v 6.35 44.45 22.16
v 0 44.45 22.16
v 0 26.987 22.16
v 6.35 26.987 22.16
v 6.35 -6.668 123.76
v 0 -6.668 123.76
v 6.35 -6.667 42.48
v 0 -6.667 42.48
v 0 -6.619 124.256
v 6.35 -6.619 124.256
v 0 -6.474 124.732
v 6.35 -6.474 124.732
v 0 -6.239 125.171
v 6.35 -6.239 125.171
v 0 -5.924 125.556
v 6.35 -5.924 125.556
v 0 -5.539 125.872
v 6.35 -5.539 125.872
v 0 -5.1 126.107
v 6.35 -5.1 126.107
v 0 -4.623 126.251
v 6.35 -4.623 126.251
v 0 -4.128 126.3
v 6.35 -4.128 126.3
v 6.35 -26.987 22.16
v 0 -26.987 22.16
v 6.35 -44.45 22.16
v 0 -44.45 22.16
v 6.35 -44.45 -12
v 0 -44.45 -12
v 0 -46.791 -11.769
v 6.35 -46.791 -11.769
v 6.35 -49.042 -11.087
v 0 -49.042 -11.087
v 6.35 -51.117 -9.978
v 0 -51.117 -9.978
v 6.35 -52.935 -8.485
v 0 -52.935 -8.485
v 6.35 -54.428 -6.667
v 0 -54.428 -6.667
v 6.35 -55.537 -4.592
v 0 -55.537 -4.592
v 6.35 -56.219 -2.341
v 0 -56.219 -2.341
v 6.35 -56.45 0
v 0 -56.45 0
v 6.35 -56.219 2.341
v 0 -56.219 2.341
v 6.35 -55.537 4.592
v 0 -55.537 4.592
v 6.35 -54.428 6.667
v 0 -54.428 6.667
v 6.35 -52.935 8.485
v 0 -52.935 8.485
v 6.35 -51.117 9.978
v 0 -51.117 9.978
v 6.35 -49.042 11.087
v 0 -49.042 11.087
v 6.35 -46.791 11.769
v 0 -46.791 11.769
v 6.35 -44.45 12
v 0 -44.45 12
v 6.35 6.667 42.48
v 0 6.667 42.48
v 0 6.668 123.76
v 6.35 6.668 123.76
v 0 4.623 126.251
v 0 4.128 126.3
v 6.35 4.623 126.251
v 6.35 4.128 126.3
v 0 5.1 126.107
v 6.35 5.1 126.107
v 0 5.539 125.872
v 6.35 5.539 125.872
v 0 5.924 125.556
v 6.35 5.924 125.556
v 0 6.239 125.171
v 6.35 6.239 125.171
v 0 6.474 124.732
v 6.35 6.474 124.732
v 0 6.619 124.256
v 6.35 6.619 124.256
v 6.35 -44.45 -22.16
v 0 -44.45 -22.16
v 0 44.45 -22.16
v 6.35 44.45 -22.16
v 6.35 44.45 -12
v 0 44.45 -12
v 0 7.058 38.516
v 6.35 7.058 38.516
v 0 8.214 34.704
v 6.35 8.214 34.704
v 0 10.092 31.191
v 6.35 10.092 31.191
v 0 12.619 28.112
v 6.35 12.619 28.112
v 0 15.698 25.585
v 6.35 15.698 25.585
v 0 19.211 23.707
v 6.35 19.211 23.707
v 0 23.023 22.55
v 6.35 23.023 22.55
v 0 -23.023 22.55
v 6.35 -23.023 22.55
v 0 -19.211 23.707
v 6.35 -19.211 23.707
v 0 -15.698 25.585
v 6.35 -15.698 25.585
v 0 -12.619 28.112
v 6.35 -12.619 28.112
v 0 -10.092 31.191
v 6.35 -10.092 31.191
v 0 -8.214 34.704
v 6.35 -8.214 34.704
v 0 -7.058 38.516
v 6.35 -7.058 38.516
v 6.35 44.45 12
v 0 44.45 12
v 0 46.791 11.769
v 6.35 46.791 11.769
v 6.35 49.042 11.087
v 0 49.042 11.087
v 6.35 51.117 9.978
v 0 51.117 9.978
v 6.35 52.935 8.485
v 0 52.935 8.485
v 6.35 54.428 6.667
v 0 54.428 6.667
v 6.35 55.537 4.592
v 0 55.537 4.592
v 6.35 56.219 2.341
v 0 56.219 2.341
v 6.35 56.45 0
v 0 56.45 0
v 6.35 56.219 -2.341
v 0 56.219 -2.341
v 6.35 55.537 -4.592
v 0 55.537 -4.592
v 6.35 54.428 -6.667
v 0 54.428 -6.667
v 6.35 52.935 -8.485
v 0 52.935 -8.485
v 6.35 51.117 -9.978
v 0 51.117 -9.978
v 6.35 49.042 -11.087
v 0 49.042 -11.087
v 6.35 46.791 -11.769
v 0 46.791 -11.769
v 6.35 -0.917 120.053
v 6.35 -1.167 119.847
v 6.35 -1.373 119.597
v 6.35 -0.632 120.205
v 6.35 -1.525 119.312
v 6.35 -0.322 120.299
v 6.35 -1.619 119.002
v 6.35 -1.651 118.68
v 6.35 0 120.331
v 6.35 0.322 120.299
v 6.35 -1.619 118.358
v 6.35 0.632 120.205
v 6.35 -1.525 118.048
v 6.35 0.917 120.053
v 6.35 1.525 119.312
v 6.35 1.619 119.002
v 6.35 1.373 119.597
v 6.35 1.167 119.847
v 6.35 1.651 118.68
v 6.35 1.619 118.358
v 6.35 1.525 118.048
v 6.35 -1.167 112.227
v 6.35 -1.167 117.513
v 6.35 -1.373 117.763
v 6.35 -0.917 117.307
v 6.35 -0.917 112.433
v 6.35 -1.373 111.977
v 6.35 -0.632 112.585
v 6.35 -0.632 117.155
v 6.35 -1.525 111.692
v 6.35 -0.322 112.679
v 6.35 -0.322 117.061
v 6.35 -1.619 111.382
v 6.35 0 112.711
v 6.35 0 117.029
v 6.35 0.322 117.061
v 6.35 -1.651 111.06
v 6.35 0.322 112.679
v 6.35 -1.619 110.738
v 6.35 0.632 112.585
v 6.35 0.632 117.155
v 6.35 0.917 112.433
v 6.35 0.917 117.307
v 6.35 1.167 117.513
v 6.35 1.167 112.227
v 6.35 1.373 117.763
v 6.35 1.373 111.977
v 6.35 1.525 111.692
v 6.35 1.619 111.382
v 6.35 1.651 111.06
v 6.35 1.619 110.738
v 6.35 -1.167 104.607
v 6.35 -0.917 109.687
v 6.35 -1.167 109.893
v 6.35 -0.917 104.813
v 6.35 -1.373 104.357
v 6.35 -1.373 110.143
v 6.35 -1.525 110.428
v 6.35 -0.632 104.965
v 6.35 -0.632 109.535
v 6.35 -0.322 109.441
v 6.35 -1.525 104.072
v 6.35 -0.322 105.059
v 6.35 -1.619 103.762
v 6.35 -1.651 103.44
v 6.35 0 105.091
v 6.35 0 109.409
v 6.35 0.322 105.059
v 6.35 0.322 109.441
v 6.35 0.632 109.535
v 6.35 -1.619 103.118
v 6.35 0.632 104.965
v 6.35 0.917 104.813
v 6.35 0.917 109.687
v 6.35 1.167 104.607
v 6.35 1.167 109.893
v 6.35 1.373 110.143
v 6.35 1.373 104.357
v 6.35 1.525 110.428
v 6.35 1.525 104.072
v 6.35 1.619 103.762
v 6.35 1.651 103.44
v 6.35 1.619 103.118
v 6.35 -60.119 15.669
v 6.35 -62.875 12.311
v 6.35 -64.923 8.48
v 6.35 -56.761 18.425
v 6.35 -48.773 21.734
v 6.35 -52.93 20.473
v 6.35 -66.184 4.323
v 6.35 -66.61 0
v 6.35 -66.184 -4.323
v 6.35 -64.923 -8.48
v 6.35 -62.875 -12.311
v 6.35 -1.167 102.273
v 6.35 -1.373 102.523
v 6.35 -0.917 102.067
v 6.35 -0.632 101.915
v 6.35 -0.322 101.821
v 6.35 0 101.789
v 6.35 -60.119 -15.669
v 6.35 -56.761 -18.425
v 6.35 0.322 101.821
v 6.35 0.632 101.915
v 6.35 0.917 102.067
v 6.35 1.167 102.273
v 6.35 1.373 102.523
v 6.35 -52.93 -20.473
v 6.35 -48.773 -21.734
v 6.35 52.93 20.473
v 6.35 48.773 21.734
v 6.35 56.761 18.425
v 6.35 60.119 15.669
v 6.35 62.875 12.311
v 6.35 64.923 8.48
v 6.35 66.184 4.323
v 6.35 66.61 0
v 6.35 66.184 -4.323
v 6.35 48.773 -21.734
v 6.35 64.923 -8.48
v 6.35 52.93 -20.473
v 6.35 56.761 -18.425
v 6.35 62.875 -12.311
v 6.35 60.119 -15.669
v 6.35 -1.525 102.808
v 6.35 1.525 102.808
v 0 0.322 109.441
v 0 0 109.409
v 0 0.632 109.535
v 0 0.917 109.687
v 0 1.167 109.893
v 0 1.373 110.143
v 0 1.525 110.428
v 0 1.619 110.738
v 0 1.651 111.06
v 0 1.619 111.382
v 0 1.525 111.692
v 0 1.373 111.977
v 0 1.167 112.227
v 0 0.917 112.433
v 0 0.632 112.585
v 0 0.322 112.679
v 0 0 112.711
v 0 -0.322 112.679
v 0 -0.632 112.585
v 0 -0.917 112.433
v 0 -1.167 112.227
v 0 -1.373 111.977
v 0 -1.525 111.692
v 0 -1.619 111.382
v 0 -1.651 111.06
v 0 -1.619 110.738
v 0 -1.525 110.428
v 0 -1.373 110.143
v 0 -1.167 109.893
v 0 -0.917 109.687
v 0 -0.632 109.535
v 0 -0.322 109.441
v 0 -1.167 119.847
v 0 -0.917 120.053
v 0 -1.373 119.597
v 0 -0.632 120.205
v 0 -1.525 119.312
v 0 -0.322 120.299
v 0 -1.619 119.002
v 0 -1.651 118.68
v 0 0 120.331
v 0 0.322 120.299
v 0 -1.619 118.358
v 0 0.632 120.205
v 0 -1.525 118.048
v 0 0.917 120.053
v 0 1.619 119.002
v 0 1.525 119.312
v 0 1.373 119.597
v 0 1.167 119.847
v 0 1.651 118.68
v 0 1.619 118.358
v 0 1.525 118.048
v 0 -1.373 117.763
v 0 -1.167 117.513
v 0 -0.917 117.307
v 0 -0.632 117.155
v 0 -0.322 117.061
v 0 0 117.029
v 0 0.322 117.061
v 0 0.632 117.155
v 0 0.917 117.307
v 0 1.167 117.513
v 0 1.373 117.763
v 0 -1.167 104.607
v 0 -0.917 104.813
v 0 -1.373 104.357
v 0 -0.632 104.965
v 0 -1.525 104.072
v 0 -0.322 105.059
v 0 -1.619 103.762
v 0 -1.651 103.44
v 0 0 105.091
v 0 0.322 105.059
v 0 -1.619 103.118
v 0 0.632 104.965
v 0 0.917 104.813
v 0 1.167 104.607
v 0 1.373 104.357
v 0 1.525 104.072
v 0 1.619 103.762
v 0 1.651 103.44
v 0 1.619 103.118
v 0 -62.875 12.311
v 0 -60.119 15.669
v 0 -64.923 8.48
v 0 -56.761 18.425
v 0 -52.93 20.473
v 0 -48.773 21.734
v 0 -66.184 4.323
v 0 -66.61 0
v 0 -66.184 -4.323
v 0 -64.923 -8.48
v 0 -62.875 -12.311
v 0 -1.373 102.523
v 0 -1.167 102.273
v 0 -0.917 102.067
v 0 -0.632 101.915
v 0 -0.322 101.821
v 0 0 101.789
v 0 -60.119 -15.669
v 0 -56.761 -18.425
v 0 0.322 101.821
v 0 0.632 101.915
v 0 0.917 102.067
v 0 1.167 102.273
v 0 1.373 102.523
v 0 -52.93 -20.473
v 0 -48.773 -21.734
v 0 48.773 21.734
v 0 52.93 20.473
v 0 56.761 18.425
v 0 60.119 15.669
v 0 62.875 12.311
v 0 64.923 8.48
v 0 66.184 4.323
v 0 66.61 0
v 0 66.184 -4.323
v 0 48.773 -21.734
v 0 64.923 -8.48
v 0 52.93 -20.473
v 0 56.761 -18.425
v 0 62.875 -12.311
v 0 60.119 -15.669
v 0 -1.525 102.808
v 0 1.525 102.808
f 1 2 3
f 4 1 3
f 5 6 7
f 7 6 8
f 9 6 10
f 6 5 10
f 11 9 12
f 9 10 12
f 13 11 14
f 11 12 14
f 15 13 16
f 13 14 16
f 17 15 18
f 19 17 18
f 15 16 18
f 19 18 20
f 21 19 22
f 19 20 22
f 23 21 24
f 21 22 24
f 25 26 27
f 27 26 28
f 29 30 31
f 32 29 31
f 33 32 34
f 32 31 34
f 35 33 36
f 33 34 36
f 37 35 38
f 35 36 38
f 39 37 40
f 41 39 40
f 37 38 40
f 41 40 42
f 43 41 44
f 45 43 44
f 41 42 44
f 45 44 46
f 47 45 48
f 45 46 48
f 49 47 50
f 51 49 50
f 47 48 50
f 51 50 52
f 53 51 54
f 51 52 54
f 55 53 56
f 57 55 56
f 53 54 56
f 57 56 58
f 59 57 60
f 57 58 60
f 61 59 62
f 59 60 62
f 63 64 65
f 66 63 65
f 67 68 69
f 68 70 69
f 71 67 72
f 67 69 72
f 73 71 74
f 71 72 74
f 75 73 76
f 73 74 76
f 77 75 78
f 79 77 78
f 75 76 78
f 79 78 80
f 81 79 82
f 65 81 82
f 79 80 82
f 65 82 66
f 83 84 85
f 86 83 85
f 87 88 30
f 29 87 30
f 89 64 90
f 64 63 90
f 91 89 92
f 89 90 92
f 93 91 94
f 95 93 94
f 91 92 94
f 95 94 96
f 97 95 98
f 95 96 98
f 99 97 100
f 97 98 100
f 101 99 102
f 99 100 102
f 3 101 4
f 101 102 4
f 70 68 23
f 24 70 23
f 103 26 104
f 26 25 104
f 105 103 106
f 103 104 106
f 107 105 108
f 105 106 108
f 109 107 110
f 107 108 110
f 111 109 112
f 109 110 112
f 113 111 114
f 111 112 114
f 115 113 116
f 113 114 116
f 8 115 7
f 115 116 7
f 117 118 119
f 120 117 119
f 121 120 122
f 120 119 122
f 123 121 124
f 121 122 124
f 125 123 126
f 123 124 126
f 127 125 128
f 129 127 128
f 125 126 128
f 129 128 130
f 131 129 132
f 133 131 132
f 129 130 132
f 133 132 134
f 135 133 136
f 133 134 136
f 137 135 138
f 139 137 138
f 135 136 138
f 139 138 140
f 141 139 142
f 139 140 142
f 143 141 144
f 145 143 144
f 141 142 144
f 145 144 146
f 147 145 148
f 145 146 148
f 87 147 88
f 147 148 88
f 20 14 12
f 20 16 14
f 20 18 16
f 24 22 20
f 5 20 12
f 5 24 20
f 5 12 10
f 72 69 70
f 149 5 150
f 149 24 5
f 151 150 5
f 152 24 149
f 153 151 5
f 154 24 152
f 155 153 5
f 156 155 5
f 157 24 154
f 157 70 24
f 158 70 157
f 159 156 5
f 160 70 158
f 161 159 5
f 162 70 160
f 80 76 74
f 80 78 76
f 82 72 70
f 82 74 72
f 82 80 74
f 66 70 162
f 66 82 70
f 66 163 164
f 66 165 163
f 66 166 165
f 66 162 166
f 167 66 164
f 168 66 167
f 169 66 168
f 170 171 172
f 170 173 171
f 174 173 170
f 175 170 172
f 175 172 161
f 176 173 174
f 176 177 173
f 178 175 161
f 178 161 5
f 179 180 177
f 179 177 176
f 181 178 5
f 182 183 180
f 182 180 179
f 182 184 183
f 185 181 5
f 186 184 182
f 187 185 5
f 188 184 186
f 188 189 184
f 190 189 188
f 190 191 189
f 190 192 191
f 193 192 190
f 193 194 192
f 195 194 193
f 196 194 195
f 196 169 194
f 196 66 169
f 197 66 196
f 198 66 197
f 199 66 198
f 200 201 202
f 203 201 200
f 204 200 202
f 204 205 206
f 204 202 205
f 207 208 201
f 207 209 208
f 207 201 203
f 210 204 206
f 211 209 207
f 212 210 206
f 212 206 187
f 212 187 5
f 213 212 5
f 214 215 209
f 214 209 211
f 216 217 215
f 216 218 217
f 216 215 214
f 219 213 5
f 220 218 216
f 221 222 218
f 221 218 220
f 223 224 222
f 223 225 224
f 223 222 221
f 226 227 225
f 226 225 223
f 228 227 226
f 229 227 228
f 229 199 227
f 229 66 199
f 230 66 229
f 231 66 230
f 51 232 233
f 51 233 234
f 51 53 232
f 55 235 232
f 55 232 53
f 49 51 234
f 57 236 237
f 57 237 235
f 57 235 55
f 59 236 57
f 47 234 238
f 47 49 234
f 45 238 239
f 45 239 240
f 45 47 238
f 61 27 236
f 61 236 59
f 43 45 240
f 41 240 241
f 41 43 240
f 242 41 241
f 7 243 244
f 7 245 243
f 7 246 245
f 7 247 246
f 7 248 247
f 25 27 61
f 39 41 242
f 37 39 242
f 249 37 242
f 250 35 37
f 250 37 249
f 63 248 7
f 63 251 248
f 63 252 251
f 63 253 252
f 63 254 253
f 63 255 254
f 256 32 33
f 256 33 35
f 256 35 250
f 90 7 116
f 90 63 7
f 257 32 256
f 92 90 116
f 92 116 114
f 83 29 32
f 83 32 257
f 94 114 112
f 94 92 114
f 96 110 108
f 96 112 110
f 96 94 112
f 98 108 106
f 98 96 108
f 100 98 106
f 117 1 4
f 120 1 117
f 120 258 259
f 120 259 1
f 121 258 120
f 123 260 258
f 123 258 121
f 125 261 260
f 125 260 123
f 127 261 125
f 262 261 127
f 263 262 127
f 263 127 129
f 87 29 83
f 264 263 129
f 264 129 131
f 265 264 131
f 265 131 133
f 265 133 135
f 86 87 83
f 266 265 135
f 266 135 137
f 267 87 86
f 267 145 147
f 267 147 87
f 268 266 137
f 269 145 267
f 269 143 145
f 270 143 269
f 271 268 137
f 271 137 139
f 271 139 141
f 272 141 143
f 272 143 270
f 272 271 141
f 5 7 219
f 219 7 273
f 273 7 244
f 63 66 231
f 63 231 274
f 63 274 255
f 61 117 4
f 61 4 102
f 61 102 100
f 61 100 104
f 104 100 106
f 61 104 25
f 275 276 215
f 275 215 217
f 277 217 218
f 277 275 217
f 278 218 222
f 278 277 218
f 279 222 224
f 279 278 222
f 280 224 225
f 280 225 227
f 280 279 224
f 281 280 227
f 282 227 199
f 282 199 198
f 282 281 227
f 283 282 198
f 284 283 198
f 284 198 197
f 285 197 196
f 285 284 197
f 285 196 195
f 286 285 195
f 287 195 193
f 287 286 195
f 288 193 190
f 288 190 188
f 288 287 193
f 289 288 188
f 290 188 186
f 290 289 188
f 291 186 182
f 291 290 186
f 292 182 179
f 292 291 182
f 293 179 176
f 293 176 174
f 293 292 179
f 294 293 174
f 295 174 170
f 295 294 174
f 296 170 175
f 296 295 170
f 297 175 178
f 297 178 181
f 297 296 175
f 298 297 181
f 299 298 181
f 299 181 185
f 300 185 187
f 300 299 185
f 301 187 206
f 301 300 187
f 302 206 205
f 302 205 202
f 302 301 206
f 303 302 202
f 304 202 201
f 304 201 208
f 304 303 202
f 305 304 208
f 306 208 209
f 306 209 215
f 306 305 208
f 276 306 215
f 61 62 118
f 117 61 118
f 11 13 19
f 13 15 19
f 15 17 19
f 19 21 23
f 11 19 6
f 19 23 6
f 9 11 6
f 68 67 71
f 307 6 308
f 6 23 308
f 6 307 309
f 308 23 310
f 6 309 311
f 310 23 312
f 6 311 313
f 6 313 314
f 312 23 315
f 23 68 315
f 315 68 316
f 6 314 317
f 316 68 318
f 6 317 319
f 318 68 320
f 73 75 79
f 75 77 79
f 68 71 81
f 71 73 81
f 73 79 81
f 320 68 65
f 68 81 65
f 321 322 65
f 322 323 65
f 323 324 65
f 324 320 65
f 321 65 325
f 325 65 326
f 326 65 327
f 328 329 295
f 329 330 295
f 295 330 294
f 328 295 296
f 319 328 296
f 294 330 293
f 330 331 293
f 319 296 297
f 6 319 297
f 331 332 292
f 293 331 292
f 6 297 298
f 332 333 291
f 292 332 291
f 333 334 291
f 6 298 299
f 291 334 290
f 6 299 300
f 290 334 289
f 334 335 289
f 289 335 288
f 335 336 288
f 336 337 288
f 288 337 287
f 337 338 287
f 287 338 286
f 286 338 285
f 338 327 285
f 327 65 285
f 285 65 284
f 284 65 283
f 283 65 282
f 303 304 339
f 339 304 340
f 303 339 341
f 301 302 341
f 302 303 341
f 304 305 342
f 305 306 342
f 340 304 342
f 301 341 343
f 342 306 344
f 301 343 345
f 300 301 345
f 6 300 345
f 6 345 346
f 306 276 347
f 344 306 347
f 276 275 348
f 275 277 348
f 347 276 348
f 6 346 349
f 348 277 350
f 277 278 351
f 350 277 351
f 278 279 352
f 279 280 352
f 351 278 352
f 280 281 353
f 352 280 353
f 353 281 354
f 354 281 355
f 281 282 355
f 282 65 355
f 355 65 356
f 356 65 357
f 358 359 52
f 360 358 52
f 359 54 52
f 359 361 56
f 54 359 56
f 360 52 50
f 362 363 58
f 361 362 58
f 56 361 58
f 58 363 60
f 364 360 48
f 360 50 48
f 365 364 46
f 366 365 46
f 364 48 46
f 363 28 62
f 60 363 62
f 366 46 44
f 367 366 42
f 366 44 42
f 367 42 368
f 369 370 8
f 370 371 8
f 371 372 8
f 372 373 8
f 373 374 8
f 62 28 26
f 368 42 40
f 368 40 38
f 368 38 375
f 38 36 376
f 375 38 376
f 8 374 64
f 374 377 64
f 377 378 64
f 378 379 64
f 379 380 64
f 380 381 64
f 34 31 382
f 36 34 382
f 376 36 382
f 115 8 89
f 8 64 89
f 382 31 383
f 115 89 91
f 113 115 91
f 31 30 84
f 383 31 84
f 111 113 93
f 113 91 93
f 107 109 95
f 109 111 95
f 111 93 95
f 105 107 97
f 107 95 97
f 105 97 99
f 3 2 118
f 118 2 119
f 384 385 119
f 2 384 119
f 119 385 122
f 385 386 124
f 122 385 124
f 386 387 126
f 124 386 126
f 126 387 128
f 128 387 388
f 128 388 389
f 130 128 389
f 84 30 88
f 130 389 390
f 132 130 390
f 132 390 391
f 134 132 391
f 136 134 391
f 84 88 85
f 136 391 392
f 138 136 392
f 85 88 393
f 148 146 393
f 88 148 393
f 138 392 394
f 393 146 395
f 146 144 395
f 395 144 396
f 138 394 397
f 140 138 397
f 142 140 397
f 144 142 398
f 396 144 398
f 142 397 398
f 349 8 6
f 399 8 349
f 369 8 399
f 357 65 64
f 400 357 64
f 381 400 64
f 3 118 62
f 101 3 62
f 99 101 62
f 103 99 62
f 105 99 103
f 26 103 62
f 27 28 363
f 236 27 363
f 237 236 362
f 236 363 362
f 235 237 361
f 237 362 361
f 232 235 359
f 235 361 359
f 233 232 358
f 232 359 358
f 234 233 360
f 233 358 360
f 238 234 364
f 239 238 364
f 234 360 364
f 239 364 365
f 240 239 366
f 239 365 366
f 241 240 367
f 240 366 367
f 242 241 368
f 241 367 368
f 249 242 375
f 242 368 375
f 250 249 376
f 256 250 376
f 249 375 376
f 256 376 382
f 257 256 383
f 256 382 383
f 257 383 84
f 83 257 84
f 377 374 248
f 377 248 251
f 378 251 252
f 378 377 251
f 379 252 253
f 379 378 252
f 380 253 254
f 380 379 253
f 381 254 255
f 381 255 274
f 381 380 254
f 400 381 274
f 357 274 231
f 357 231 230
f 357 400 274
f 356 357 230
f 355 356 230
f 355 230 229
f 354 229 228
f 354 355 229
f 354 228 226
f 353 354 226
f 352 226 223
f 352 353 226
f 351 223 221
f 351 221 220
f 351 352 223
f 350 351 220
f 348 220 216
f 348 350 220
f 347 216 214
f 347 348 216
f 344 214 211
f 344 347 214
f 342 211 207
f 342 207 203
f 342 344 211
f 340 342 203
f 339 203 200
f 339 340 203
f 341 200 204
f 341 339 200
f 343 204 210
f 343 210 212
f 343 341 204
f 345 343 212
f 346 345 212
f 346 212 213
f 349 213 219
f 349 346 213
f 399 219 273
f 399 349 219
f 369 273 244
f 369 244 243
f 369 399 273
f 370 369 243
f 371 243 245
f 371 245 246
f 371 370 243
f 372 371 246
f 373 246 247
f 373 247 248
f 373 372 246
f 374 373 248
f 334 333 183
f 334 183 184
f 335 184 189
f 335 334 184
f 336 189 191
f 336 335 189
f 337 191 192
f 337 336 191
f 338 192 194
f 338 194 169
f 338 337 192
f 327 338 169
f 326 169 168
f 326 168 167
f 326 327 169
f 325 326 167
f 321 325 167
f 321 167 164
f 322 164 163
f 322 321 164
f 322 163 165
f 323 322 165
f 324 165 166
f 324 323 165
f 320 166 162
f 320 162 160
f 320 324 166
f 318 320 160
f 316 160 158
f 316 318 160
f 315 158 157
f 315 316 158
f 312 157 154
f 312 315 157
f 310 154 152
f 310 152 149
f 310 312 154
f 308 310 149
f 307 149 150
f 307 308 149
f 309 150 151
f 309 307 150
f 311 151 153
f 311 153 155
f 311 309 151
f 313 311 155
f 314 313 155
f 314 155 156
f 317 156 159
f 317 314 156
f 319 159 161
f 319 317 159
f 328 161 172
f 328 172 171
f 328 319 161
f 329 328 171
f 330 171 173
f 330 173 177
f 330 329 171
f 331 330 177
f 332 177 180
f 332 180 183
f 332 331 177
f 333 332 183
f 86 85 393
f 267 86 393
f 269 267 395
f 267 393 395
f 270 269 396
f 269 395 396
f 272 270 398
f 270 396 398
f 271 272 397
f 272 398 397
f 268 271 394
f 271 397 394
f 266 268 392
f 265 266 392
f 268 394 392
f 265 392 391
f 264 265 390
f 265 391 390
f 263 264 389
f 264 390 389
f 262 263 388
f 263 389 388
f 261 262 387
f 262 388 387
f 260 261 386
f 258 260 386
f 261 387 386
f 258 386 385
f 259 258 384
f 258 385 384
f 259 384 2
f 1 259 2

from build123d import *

# Parameters (mm, degrees)
SKETCH2_R           = 1.651
BOSS_EXTRUDE2_DEPTH = 6.35
FILLET2_R           = 20.32
FILLET3_R           = 2.54


with BuildPart() as part:
    # Sketch2 → Boss-Extrude2 (new body)
    with BuildSketch(Plane(origin=(0, 0, 0), x_dir=(0, 0, -1), z_dir=(1, 0, 0))):
        with BuildLine():
            Line((-22.16, -6.6675), (-22.16, -44.45))
            ThreePointArc((-22.16, -44.45), (0, -66.61), (22.16, -44.45))
            Line((22.16, -44.45), (22.16, 44.45))
            ThreePointArc((22.16, 44.45), (0, 66.61), (-22.16, 44.45))
            Line((-22.16, 44.45), (-22.16, 6.6675))
            Line((-22.16, 6.6675), (-126.3, 6.6675))
            Line((-126.3, 6.6675), (-126.3, -6.6675))
            Line((-126.3, -6.6675), (-22.16, -6.6675))
        make_face()
        with BuildLine():
            ThreePointArc((12, -44.45), (0, -56.45), (-12, -44.45))
            Line((-12, -44.45), (-12, 44.45))
            ThreePointArc((-12, 44.45), (0, 56.45), (12, 44.45))
            Line((12, 44.45), (12, -44.45))
        make_face(mode=Mode.SUBTRACT)
        with Locations((-111.06, 0)):
            Circle(SKETCH2_R, mode=Mode.SUBTRACT)
        with Locations((-103.44, 0)):
            Circle(SKETCH2_R, mode=Mode.SUBTRACT)
        with Locations((-118.68, 0)):
            Circle(SKETCH2_R, mode=Mode.SUBTRACT)
    extrude(amount=BOSS_EXTRUDE2_DEPTH)

    # Fillet2
    fillet2_edges = [part.edges().sort_by_distance(p)[0] for p in [
        (3.175, 6.6675, 22.16),
        (3.175, -6.6675, 22.16),
    ]]
    fillet(fillet2_edges, radius=FILLET2_R)

    # Fillet3
    fillet3_edges = [part.edges().sort_by_distance(p)[0] for p in [
        (3.175, 6.6675, 126.3),
        (3.175, -6.6675, 126.3),
    ]]
    fillet(fillet3_edges, radius=FILLET3_R)


solid = part.part
